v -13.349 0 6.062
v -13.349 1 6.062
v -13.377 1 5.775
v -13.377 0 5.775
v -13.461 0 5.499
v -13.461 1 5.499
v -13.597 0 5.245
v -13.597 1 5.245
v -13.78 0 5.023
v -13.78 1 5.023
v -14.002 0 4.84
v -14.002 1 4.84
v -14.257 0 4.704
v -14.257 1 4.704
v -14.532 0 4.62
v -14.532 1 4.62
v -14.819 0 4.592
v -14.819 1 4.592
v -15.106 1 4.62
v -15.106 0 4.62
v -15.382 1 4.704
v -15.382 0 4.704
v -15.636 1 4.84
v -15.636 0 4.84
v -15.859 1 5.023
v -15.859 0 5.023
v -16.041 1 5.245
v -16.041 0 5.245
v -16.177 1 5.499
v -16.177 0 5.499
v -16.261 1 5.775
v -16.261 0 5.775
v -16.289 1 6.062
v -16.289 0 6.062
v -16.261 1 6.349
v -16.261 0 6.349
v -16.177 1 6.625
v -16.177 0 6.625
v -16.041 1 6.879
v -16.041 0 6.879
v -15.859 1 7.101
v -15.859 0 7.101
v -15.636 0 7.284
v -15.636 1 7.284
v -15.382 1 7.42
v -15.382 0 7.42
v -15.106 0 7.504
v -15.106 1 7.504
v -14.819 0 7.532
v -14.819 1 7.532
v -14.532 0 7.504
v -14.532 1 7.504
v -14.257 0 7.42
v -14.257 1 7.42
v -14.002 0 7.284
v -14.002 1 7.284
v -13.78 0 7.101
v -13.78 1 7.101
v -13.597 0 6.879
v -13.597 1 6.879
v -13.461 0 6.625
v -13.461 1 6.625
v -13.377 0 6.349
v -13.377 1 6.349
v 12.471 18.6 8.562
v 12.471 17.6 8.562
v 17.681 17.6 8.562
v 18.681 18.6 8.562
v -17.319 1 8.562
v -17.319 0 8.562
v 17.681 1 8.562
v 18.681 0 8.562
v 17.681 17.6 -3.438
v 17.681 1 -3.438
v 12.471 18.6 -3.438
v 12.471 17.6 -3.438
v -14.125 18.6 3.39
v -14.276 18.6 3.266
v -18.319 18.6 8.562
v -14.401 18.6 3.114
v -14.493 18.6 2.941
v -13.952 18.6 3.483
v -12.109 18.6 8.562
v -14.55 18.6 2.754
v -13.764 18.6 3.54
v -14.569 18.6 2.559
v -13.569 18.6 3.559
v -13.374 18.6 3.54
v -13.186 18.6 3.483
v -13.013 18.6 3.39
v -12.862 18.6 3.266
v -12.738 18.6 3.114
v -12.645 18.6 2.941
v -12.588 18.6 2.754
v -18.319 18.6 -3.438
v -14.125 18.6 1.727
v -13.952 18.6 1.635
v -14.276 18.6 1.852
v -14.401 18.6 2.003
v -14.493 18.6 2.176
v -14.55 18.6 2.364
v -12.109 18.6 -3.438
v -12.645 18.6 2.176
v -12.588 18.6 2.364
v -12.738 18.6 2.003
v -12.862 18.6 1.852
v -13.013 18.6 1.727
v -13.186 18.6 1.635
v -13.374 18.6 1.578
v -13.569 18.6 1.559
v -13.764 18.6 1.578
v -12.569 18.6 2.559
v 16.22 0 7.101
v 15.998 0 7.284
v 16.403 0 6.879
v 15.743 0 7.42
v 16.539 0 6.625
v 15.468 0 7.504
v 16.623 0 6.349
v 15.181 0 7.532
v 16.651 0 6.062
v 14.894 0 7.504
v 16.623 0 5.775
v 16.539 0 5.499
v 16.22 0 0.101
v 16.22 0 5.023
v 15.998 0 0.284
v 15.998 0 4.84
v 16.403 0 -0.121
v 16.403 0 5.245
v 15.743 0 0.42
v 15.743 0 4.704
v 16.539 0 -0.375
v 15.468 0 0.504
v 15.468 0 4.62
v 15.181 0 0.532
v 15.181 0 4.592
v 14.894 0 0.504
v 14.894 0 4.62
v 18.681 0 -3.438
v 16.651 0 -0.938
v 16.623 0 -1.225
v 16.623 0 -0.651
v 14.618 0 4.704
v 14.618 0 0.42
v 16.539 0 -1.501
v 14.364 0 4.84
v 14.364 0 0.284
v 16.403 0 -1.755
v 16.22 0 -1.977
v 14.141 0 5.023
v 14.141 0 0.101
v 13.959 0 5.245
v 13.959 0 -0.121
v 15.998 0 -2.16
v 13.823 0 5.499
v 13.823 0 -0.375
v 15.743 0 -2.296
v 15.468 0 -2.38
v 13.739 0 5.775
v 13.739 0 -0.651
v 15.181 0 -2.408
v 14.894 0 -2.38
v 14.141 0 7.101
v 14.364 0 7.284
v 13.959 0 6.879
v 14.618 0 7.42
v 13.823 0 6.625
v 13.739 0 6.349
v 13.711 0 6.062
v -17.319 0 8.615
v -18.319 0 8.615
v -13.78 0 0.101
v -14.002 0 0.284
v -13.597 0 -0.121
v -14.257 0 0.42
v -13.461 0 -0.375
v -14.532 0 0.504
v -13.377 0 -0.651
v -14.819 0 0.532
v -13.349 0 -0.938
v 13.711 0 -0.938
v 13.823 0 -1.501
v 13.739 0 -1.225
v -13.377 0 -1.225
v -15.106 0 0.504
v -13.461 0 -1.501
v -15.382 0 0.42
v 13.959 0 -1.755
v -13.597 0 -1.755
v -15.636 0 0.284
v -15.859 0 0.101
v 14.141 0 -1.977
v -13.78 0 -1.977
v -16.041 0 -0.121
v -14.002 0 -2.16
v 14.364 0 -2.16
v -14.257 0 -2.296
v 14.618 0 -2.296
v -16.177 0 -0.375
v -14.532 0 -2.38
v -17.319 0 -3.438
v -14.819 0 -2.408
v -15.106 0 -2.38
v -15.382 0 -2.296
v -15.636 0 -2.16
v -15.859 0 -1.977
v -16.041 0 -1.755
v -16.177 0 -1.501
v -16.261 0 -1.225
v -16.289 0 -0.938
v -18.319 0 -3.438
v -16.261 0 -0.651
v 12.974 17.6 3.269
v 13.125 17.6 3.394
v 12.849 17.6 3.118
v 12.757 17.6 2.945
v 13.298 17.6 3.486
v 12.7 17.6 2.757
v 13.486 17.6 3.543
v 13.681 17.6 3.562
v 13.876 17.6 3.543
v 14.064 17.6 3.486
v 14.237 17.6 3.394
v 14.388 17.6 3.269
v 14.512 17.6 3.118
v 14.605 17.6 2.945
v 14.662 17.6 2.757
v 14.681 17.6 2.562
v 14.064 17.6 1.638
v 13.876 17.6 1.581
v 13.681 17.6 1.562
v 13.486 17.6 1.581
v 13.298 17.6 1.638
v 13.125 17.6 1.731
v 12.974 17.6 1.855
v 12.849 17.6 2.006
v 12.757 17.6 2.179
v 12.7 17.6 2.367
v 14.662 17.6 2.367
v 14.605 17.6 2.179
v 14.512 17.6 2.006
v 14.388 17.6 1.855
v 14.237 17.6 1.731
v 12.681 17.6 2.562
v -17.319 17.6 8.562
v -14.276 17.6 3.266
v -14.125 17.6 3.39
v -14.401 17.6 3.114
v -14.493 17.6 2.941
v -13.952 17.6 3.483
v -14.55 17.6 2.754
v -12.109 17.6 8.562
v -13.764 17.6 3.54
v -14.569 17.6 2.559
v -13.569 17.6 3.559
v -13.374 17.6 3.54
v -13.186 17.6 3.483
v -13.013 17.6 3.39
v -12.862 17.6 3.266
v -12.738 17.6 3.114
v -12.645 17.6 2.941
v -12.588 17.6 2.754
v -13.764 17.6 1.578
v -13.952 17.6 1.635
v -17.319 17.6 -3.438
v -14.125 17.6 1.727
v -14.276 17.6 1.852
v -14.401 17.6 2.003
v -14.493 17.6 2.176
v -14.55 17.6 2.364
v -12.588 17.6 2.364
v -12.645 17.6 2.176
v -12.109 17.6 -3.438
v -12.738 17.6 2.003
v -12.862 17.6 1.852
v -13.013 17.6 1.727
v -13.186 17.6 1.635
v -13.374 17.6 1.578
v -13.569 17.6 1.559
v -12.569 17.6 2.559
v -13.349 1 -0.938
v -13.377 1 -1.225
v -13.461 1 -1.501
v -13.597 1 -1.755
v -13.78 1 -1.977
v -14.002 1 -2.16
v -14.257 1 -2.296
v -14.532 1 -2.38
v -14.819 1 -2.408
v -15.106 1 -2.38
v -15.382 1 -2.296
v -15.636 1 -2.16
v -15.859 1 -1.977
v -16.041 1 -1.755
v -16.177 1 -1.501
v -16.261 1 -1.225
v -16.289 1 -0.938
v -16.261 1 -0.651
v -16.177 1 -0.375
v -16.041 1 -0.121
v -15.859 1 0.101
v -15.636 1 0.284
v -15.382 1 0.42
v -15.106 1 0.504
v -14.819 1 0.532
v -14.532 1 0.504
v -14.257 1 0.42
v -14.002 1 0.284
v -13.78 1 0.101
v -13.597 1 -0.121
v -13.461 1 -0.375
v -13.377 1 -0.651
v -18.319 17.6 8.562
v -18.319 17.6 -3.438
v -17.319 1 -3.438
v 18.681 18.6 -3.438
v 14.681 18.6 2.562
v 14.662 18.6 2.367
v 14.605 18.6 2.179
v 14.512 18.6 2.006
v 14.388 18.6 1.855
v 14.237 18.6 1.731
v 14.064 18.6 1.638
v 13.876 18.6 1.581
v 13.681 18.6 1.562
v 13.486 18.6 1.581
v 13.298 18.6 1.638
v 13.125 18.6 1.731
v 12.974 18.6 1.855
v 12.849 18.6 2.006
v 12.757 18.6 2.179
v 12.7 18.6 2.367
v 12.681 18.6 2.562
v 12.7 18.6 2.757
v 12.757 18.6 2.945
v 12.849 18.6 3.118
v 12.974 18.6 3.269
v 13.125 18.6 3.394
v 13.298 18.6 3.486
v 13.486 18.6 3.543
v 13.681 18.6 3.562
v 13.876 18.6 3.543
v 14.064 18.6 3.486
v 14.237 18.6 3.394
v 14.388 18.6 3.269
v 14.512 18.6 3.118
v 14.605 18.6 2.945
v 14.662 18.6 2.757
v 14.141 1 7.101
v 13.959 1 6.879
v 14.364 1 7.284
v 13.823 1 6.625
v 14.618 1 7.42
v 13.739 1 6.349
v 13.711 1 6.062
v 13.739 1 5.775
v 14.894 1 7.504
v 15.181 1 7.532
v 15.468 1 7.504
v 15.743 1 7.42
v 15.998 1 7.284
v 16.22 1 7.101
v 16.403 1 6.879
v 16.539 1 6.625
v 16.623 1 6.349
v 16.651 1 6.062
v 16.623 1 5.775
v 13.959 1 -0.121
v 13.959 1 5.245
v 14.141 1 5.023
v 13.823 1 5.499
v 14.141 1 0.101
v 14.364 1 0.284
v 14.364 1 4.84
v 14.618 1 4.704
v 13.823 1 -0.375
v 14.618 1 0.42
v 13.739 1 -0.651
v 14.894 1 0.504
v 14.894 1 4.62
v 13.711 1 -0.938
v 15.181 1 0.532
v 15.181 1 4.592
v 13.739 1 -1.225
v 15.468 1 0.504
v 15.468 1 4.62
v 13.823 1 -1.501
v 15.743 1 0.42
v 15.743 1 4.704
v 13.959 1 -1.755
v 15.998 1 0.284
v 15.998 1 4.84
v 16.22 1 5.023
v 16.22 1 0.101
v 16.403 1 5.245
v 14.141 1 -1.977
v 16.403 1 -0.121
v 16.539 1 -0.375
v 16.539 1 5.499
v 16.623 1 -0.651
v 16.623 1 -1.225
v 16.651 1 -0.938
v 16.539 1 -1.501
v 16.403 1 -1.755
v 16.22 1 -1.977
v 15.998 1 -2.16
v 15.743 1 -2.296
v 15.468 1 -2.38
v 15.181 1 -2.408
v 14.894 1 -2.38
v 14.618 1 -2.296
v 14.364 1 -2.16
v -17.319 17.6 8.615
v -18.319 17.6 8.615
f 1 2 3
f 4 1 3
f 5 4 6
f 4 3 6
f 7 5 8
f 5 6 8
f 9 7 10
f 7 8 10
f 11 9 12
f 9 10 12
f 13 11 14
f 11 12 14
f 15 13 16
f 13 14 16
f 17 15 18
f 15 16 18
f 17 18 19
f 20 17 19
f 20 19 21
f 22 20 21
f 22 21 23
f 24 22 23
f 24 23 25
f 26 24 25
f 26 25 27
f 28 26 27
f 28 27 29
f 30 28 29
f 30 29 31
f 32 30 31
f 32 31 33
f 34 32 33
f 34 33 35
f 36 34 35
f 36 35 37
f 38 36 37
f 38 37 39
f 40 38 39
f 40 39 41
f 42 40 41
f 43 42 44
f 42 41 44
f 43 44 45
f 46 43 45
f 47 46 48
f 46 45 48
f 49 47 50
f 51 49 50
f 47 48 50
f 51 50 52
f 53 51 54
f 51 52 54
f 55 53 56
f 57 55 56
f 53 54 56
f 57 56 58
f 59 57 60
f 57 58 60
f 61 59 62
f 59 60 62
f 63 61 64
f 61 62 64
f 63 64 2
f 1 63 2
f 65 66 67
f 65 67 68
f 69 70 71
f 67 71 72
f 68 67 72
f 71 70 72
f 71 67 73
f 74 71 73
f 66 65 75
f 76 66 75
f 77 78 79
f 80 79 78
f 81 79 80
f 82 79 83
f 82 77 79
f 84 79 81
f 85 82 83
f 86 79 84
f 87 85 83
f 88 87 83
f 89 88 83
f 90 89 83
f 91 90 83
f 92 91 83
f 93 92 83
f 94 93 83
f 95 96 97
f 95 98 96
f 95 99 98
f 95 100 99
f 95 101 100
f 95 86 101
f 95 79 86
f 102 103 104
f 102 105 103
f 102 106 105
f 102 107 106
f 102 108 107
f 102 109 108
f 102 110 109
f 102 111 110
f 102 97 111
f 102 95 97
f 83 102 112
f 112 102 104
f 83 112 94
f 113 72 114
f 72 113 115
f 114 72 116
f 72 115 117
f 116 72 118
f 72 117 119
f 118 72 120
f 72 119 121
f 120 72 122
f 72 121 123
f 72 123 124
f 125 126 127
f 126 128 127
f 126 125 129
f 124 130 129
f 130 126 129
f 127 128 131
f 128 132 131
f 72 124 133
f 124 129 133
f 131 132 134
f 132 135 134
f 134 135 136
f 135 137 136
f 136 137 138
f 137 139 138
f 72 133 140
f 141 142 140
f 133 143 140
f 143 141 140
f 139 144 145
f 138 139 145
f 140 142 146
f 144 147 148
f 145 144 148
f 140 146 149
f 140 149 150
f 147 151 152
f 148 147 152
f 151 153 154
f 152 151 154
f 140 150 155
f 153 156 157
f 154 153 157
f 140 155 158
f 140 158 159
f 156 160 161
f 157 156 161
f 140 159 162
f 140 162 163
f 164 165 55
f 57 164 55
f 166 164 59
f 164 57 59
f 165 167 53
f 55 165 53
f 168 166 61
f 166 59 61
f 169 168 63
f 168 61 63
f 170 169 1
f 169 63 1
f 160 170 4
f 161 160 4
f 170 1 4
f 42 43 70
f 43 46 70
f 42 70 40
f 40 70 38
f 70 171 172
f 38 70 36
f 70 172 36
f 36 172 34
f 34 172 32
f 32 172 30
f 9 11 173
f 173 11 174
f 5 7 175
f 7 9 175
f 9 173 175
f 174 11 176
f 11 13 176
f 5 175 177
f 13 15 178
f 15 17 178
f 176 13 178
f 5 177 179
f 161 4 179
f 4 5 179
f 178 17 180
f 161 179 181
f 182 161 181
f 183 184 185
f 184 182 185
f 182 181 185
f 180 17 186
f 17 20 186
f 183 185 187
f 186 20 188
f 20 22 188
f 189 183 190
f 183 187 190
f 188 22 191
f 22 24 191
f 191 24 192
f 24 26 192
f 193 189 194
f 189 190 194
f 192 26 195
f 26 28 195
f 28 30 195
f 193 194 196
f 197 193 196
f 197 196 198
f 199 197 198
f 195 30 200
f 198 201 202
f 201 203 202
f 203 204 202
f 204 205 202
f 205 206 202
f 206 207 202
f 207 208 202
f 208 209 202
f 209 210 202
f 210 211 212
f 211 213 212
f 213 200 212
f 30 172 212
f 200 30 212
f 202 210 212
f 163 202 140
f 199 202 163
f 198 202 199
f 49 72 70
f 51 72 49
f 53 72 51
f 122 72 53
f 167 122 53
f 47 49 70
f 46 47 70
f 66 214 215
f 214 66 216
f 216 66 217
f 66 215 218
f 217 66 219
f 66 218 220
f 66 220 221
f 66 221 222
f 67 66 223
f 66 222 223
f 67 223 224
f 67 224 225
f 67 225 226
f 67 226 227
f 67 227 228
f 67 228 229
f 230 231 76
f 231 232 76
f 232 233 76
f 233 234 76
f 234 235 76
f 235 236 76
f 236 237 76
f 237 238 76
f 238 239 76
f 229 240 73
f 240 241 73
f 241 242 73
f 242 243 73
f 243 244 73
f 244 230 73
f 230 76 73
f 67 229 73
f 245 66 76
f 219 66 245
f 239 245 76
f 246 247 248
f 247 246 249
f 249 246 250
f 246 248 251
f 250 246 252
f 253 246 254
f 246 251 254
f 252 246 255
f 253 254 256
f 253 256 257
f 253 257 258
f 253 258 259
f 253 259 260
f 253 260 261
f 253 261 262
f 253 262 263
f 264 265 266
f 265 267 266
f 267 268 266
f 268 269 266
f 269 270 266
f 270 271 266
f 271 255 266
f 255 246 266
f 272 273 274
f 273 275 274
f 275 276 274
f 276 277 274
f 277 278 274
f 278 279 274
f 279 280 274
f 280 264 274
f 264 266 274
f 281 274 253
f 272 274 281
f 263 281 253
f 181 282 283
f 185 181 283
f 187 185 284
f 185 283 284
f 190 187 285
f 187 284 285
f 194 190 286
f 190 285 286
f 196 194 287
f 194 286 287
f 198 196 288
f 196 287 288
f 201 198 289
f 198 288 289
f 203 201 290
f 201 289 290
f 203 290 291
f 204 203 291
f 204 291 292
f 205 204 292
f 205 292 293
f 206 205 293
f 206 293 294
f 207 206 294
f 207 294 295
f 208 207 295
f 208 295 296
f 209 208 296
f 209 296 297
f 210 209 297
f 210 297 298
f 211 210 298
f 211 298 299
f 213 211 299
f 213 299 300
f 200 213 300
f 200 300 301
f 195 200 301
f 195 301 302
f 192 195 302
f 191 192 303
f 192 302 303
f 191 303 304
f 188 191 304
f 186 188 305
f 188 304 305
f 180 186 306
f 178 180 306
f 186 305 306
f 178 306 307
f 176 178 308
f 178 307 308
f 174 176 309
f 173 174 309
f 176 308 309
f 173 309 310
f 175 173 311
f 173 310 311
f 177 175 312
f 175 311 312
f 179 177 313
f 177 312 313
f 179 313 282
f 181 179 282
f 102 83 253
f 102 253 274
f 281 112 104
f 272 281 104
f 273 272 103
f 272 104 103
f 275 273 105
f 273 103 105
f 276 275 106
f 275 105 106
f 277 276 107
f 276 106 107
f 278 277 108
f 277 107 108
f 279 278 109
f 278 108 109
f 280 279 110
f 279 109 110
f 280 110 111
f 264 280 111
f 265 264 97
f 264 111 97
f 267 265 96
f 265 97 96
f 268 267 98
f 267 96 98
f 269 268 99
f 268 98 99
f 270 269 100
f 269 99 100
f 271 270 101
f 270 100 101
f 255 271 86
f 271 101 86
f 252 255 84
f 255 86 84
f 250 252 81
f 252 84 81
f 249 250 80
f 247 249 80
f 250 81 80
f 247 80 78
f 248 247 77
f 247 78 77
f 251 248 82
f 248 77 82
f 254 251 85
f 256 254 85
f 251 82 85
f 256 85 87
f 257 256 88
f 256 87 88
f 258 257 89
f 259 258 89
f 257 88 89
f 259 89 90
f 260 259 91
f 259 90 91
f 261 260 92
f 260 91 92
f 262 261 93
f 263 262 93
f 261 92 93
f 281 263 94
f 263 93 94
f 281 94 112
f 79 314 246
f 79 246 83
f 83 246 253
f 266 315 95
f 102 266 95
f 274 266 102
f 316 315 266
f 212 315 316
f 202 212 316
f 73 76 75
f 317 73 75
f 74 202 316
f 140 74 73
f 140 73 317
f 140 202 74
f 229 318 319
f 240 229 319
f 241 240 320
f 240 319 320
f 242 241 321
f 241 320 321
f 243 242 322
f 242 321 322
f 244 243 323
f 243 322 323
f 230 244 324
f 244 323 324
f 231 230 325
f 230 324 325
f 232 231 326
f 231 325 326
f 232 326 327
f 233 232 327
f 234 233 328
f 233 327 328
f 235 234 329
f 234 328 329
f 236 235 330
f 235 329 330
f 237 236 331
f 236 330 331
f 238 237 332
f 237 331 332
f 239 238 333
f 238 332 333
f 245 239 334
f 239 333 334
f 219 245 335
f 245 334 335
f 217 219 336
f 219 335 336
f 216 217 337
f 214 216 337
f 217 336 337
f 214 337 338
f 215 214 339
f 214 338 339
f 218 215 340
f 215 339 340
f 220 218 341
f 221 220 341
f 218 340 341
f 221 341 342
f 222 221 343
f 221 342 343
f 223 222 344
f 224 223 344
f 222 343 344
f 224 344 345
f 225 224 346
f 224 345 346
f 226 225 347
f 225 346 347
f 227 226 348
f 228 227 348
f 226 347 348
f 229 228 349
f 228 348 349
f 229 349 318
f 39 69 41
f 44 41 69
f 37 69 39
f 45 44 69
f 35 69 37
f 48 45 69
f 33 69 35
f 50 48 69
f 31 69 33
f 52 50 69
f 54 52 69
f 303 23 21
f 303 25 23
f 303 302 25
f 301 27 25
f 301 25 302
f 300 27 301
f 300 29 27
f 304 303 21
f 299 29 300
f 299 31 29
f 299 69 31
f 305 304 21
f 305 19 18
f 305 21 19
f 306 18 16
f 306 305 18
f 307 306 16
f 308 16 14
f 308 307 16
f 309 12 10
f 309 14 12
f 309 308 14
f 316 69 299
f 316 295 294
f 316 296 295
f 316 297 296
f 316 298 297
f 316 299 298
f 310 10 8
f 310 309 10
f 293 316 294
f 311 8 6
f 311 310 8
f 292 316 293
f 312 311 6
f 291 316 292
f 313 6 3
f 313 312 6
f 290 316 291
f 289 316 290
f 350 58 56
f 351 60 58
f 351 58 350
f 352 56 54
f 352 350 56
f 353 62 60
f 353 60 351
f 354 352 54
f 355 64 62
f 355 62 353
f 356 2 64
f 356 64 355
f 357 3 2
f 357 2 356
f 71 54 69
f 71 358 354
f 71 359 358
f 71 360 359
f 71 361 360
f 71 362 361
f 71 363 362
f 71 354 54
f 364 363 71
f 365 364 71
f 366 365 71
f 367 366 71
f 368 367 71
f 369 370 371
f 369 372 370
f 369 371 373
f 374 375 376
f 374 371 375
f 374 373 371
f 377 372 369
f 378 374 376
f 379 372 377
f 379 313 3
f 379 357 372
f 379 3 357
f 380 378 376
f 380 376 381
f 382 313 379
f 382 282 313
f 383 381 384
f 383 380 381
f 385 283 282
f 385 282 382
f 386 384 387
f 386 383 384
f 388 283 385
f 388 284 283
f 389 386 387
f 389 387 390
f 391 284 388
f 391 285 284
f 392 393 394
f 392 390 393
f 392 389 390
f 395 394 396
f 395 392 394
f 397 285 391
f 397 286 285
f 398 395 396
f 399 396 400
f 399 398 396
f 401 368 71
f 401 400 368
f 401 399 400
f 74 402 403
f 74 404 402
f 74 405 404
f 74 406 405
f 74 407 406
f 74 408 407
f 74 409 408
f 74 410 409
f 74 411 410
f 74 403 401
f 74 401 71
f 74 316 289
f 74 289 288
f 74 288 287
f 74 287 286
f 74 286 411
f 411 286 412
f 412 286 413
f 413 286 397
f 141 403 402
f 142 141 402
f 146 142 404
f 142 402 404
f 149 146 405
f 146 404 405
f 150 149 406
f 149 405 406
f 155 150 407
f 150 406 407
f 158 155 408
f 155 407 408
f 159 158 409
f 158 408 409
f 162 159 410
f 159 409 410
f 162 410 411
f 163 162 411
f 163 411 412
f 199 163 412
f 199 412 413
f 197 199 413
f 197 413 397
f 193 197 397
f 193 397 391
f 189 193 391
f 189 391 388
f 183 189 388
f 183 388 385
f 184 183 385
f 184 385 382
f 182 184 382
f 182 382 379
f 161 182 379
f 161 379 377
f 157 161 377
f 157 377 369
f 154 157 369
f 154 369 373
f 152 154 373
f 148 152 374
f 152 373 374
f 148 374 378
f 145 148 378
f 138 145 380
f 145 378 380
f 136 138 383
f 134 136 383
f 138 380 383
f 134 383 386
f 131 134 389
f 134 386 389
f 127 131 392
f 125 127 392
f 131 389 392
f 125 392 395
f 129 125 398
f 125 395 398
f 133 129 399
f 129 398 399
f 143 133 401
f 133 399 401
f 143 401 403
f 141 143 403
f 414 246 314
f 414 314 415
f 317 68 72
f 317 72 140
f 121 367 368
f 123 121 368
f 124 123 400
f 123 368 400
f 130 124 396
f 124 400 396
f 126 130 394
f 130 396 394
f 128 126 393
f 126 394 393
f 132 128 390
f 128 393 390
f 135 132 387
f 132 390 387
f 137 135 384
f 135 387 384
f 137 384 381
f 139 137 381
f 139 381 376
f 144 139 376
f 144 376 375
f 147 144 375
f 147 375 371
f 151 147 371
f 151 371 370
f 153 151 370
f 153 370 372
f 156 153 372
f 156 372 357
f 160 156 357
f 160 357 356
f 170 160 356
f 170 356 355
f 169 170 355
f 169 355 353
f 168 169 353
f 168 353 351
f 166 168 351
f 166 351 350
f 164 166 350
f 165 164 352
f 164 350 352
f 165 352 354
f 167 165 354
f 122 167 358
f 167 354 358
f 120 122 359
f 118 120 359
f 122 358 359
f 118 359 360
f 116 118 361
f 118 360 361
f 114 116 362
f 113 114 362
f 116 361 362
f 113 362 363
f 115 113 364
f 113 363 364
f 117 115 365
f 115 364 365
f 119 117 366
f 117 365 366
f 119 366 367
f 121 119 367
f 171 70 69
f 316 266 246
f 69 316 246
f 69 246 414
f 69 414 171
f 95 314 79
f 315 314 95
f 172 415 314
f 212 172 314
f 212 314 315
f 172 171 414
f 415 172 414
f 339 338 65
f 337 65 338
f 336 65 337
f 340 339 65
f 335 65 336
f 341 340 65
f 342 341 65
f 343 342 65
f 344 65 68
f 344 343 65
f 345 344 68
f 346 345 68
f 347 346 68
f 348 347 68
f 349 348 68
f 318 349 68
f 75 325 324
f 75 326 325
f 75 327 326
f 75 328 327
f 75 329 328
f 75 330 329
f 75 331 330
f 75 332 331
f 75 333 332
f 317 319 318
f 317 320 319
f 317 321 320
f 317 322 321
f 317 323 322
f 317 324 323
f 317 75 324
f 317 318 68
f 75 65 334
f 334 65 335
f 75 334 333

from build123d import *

# Parameters (mm, degrees)
SKETCH1_W           = 35
SKETCH1_H           = 12
BOSS_EXTRUDE1_DEPTH = 1
SKETCH2_W           = 12.053455819
SKETCH2_H           = 17.6
BOSS_EXTRUDE2_DEPTH = 1
SKETCH3_W           = 12
SKETCH3_H           = 17.6
BOSS_EXTRUDE3_DEPTH = 1
SKETCH5_W           = 37
SKETCH5_H           = 12
BOSS_EXTRUDE4_DEPTH = 1
SKETCH6_W           = 24.58
SKETCH6_H           = 12
CUT_EXTRUDE1_DEPTH  = 1
SKETCH7_R           = 1
CUT_EXTRUDE2_DEPTH  = 1
SKETCH8_R           = 1
CUT_EXTRUDE3_DEPTH  = 1
SKETCH9_R           = 1.47
CUT_EXTRUDE4_DEPTH  = 10


with BuildPart() as part:
    # Sketch1 → Boss-Extrude1 (new body)
    with BuildSketch(Plane(origin=(0, 0, 0), x_dir=(1, 0, 0), z_dir=(0, 1, 0))):
        with Locations((0.180945347, -2.562038405)):
            Rectangle(SKETCH1_W, SKETCH1_H)
    extrude(amount=BOSS_EXTRUDE1_DEPTH)

    # Sketch2 → Boss-Extrude2 (add)
    with BuildSketch(Plane.ZY.offset(17.319054653)):
        with Locations((2.588766314, 8.8)):
            Rectangle(SKETCH2_W, SKETCH2_H)
    extrude(amount=BOSS_EXTRUDE2_DEPTH)

    # Sketch3 → Boss-Extrude3 (add)
    with BuildSketch(Plane(origin=(17.680945347, 0, 0), x_dir=(0, 0, -1), z_dir=(1, 0, 0))):
        with Locations((-2.562038405, 8.8)):
            Rectangle(SKETCH3_W, SKETCH3_H)
    extrude(amount=BOSS_EXTRUDE3_DEPTH)

    # Sketch5 → Boss-Extrude4 (add)
    with BuildSketch(Plane(origin=(0, 17.6, 0), x_dir=(1, 0, 0), z_dir=(0, 1, 0))):
        with Locations((0.180945347, -2.562038405)):
            Rectangle(SKETCH5_W, SKETCH5_H)
    extrude(amount=BOSS_EXTRUDE4_DEPTH)

    # Sketch6 → Cut-Extrude1 (cut)
    with BuildSketch(Plane(origin=(0, 18.6, 0), x_dir=(1, 0, 0), z_dir=(0, 1, 0))):
        with Locations((0.180945347, -2.562038405)):
            Rectangle(SKETCH6_W, SKETCH6_H)
    extrude(amount=-CUT_EXTRUDE1_DEPTH, mode=Mode.SUBTRACT)

    # Sketch7 → Cut-Extrude2 (cut)
    with BuildSketch(Plane(origin=(0, 18.6, 0), x_dir=(1, 0, 0), z_dir=(0, 1, 0))):
        with Locations((13.680945347, -2.562038405)):
            Circle(SKETCH7_R)
    extrude(amount=-CUT_EXTRUDE2_DEPTH, mode=Mode.SUBTRACT)

    # Sketch8 → Cut-Extrude3 (cut)
    with BuildSketch(Plane(origin=(0, 18.6, 0), x_dir=(1, 0, 0), z_dir=(0, 1, 0))):
        with Locations((-13.569054453, -2.558738176)):
            Circle(SKETCH8_R)
    extrude(amount=-CUT_EXTRUDE3_DEPTH, mode=Mode.SUBTRACT)

    # Sketch9 → Cut-Extrude4 (cut)
    with BuildSketch(Plane(origin=(0, 1, 0), x_dir=(1, 0, 0), z_dir=(0, 1, 0))):
        with Locations((15.180945347, 0.937961595)):
            Circle(SKETCH9_R)
        with Locations((15.180945347, -6.062038405)):
            Circle(SKETCH9_R)
        with Locations((-14.819054653, 0.937961595)):
            Circle(SKETCH9_R)
        with Locations((-14.819054653, -6.062038405)):
            Circle(SKETCH9_R)
    extrude(amount=-CUT_EXTRUDE4_DEPTH, mode=Mode.SUBTRACT)


solid = part.part
